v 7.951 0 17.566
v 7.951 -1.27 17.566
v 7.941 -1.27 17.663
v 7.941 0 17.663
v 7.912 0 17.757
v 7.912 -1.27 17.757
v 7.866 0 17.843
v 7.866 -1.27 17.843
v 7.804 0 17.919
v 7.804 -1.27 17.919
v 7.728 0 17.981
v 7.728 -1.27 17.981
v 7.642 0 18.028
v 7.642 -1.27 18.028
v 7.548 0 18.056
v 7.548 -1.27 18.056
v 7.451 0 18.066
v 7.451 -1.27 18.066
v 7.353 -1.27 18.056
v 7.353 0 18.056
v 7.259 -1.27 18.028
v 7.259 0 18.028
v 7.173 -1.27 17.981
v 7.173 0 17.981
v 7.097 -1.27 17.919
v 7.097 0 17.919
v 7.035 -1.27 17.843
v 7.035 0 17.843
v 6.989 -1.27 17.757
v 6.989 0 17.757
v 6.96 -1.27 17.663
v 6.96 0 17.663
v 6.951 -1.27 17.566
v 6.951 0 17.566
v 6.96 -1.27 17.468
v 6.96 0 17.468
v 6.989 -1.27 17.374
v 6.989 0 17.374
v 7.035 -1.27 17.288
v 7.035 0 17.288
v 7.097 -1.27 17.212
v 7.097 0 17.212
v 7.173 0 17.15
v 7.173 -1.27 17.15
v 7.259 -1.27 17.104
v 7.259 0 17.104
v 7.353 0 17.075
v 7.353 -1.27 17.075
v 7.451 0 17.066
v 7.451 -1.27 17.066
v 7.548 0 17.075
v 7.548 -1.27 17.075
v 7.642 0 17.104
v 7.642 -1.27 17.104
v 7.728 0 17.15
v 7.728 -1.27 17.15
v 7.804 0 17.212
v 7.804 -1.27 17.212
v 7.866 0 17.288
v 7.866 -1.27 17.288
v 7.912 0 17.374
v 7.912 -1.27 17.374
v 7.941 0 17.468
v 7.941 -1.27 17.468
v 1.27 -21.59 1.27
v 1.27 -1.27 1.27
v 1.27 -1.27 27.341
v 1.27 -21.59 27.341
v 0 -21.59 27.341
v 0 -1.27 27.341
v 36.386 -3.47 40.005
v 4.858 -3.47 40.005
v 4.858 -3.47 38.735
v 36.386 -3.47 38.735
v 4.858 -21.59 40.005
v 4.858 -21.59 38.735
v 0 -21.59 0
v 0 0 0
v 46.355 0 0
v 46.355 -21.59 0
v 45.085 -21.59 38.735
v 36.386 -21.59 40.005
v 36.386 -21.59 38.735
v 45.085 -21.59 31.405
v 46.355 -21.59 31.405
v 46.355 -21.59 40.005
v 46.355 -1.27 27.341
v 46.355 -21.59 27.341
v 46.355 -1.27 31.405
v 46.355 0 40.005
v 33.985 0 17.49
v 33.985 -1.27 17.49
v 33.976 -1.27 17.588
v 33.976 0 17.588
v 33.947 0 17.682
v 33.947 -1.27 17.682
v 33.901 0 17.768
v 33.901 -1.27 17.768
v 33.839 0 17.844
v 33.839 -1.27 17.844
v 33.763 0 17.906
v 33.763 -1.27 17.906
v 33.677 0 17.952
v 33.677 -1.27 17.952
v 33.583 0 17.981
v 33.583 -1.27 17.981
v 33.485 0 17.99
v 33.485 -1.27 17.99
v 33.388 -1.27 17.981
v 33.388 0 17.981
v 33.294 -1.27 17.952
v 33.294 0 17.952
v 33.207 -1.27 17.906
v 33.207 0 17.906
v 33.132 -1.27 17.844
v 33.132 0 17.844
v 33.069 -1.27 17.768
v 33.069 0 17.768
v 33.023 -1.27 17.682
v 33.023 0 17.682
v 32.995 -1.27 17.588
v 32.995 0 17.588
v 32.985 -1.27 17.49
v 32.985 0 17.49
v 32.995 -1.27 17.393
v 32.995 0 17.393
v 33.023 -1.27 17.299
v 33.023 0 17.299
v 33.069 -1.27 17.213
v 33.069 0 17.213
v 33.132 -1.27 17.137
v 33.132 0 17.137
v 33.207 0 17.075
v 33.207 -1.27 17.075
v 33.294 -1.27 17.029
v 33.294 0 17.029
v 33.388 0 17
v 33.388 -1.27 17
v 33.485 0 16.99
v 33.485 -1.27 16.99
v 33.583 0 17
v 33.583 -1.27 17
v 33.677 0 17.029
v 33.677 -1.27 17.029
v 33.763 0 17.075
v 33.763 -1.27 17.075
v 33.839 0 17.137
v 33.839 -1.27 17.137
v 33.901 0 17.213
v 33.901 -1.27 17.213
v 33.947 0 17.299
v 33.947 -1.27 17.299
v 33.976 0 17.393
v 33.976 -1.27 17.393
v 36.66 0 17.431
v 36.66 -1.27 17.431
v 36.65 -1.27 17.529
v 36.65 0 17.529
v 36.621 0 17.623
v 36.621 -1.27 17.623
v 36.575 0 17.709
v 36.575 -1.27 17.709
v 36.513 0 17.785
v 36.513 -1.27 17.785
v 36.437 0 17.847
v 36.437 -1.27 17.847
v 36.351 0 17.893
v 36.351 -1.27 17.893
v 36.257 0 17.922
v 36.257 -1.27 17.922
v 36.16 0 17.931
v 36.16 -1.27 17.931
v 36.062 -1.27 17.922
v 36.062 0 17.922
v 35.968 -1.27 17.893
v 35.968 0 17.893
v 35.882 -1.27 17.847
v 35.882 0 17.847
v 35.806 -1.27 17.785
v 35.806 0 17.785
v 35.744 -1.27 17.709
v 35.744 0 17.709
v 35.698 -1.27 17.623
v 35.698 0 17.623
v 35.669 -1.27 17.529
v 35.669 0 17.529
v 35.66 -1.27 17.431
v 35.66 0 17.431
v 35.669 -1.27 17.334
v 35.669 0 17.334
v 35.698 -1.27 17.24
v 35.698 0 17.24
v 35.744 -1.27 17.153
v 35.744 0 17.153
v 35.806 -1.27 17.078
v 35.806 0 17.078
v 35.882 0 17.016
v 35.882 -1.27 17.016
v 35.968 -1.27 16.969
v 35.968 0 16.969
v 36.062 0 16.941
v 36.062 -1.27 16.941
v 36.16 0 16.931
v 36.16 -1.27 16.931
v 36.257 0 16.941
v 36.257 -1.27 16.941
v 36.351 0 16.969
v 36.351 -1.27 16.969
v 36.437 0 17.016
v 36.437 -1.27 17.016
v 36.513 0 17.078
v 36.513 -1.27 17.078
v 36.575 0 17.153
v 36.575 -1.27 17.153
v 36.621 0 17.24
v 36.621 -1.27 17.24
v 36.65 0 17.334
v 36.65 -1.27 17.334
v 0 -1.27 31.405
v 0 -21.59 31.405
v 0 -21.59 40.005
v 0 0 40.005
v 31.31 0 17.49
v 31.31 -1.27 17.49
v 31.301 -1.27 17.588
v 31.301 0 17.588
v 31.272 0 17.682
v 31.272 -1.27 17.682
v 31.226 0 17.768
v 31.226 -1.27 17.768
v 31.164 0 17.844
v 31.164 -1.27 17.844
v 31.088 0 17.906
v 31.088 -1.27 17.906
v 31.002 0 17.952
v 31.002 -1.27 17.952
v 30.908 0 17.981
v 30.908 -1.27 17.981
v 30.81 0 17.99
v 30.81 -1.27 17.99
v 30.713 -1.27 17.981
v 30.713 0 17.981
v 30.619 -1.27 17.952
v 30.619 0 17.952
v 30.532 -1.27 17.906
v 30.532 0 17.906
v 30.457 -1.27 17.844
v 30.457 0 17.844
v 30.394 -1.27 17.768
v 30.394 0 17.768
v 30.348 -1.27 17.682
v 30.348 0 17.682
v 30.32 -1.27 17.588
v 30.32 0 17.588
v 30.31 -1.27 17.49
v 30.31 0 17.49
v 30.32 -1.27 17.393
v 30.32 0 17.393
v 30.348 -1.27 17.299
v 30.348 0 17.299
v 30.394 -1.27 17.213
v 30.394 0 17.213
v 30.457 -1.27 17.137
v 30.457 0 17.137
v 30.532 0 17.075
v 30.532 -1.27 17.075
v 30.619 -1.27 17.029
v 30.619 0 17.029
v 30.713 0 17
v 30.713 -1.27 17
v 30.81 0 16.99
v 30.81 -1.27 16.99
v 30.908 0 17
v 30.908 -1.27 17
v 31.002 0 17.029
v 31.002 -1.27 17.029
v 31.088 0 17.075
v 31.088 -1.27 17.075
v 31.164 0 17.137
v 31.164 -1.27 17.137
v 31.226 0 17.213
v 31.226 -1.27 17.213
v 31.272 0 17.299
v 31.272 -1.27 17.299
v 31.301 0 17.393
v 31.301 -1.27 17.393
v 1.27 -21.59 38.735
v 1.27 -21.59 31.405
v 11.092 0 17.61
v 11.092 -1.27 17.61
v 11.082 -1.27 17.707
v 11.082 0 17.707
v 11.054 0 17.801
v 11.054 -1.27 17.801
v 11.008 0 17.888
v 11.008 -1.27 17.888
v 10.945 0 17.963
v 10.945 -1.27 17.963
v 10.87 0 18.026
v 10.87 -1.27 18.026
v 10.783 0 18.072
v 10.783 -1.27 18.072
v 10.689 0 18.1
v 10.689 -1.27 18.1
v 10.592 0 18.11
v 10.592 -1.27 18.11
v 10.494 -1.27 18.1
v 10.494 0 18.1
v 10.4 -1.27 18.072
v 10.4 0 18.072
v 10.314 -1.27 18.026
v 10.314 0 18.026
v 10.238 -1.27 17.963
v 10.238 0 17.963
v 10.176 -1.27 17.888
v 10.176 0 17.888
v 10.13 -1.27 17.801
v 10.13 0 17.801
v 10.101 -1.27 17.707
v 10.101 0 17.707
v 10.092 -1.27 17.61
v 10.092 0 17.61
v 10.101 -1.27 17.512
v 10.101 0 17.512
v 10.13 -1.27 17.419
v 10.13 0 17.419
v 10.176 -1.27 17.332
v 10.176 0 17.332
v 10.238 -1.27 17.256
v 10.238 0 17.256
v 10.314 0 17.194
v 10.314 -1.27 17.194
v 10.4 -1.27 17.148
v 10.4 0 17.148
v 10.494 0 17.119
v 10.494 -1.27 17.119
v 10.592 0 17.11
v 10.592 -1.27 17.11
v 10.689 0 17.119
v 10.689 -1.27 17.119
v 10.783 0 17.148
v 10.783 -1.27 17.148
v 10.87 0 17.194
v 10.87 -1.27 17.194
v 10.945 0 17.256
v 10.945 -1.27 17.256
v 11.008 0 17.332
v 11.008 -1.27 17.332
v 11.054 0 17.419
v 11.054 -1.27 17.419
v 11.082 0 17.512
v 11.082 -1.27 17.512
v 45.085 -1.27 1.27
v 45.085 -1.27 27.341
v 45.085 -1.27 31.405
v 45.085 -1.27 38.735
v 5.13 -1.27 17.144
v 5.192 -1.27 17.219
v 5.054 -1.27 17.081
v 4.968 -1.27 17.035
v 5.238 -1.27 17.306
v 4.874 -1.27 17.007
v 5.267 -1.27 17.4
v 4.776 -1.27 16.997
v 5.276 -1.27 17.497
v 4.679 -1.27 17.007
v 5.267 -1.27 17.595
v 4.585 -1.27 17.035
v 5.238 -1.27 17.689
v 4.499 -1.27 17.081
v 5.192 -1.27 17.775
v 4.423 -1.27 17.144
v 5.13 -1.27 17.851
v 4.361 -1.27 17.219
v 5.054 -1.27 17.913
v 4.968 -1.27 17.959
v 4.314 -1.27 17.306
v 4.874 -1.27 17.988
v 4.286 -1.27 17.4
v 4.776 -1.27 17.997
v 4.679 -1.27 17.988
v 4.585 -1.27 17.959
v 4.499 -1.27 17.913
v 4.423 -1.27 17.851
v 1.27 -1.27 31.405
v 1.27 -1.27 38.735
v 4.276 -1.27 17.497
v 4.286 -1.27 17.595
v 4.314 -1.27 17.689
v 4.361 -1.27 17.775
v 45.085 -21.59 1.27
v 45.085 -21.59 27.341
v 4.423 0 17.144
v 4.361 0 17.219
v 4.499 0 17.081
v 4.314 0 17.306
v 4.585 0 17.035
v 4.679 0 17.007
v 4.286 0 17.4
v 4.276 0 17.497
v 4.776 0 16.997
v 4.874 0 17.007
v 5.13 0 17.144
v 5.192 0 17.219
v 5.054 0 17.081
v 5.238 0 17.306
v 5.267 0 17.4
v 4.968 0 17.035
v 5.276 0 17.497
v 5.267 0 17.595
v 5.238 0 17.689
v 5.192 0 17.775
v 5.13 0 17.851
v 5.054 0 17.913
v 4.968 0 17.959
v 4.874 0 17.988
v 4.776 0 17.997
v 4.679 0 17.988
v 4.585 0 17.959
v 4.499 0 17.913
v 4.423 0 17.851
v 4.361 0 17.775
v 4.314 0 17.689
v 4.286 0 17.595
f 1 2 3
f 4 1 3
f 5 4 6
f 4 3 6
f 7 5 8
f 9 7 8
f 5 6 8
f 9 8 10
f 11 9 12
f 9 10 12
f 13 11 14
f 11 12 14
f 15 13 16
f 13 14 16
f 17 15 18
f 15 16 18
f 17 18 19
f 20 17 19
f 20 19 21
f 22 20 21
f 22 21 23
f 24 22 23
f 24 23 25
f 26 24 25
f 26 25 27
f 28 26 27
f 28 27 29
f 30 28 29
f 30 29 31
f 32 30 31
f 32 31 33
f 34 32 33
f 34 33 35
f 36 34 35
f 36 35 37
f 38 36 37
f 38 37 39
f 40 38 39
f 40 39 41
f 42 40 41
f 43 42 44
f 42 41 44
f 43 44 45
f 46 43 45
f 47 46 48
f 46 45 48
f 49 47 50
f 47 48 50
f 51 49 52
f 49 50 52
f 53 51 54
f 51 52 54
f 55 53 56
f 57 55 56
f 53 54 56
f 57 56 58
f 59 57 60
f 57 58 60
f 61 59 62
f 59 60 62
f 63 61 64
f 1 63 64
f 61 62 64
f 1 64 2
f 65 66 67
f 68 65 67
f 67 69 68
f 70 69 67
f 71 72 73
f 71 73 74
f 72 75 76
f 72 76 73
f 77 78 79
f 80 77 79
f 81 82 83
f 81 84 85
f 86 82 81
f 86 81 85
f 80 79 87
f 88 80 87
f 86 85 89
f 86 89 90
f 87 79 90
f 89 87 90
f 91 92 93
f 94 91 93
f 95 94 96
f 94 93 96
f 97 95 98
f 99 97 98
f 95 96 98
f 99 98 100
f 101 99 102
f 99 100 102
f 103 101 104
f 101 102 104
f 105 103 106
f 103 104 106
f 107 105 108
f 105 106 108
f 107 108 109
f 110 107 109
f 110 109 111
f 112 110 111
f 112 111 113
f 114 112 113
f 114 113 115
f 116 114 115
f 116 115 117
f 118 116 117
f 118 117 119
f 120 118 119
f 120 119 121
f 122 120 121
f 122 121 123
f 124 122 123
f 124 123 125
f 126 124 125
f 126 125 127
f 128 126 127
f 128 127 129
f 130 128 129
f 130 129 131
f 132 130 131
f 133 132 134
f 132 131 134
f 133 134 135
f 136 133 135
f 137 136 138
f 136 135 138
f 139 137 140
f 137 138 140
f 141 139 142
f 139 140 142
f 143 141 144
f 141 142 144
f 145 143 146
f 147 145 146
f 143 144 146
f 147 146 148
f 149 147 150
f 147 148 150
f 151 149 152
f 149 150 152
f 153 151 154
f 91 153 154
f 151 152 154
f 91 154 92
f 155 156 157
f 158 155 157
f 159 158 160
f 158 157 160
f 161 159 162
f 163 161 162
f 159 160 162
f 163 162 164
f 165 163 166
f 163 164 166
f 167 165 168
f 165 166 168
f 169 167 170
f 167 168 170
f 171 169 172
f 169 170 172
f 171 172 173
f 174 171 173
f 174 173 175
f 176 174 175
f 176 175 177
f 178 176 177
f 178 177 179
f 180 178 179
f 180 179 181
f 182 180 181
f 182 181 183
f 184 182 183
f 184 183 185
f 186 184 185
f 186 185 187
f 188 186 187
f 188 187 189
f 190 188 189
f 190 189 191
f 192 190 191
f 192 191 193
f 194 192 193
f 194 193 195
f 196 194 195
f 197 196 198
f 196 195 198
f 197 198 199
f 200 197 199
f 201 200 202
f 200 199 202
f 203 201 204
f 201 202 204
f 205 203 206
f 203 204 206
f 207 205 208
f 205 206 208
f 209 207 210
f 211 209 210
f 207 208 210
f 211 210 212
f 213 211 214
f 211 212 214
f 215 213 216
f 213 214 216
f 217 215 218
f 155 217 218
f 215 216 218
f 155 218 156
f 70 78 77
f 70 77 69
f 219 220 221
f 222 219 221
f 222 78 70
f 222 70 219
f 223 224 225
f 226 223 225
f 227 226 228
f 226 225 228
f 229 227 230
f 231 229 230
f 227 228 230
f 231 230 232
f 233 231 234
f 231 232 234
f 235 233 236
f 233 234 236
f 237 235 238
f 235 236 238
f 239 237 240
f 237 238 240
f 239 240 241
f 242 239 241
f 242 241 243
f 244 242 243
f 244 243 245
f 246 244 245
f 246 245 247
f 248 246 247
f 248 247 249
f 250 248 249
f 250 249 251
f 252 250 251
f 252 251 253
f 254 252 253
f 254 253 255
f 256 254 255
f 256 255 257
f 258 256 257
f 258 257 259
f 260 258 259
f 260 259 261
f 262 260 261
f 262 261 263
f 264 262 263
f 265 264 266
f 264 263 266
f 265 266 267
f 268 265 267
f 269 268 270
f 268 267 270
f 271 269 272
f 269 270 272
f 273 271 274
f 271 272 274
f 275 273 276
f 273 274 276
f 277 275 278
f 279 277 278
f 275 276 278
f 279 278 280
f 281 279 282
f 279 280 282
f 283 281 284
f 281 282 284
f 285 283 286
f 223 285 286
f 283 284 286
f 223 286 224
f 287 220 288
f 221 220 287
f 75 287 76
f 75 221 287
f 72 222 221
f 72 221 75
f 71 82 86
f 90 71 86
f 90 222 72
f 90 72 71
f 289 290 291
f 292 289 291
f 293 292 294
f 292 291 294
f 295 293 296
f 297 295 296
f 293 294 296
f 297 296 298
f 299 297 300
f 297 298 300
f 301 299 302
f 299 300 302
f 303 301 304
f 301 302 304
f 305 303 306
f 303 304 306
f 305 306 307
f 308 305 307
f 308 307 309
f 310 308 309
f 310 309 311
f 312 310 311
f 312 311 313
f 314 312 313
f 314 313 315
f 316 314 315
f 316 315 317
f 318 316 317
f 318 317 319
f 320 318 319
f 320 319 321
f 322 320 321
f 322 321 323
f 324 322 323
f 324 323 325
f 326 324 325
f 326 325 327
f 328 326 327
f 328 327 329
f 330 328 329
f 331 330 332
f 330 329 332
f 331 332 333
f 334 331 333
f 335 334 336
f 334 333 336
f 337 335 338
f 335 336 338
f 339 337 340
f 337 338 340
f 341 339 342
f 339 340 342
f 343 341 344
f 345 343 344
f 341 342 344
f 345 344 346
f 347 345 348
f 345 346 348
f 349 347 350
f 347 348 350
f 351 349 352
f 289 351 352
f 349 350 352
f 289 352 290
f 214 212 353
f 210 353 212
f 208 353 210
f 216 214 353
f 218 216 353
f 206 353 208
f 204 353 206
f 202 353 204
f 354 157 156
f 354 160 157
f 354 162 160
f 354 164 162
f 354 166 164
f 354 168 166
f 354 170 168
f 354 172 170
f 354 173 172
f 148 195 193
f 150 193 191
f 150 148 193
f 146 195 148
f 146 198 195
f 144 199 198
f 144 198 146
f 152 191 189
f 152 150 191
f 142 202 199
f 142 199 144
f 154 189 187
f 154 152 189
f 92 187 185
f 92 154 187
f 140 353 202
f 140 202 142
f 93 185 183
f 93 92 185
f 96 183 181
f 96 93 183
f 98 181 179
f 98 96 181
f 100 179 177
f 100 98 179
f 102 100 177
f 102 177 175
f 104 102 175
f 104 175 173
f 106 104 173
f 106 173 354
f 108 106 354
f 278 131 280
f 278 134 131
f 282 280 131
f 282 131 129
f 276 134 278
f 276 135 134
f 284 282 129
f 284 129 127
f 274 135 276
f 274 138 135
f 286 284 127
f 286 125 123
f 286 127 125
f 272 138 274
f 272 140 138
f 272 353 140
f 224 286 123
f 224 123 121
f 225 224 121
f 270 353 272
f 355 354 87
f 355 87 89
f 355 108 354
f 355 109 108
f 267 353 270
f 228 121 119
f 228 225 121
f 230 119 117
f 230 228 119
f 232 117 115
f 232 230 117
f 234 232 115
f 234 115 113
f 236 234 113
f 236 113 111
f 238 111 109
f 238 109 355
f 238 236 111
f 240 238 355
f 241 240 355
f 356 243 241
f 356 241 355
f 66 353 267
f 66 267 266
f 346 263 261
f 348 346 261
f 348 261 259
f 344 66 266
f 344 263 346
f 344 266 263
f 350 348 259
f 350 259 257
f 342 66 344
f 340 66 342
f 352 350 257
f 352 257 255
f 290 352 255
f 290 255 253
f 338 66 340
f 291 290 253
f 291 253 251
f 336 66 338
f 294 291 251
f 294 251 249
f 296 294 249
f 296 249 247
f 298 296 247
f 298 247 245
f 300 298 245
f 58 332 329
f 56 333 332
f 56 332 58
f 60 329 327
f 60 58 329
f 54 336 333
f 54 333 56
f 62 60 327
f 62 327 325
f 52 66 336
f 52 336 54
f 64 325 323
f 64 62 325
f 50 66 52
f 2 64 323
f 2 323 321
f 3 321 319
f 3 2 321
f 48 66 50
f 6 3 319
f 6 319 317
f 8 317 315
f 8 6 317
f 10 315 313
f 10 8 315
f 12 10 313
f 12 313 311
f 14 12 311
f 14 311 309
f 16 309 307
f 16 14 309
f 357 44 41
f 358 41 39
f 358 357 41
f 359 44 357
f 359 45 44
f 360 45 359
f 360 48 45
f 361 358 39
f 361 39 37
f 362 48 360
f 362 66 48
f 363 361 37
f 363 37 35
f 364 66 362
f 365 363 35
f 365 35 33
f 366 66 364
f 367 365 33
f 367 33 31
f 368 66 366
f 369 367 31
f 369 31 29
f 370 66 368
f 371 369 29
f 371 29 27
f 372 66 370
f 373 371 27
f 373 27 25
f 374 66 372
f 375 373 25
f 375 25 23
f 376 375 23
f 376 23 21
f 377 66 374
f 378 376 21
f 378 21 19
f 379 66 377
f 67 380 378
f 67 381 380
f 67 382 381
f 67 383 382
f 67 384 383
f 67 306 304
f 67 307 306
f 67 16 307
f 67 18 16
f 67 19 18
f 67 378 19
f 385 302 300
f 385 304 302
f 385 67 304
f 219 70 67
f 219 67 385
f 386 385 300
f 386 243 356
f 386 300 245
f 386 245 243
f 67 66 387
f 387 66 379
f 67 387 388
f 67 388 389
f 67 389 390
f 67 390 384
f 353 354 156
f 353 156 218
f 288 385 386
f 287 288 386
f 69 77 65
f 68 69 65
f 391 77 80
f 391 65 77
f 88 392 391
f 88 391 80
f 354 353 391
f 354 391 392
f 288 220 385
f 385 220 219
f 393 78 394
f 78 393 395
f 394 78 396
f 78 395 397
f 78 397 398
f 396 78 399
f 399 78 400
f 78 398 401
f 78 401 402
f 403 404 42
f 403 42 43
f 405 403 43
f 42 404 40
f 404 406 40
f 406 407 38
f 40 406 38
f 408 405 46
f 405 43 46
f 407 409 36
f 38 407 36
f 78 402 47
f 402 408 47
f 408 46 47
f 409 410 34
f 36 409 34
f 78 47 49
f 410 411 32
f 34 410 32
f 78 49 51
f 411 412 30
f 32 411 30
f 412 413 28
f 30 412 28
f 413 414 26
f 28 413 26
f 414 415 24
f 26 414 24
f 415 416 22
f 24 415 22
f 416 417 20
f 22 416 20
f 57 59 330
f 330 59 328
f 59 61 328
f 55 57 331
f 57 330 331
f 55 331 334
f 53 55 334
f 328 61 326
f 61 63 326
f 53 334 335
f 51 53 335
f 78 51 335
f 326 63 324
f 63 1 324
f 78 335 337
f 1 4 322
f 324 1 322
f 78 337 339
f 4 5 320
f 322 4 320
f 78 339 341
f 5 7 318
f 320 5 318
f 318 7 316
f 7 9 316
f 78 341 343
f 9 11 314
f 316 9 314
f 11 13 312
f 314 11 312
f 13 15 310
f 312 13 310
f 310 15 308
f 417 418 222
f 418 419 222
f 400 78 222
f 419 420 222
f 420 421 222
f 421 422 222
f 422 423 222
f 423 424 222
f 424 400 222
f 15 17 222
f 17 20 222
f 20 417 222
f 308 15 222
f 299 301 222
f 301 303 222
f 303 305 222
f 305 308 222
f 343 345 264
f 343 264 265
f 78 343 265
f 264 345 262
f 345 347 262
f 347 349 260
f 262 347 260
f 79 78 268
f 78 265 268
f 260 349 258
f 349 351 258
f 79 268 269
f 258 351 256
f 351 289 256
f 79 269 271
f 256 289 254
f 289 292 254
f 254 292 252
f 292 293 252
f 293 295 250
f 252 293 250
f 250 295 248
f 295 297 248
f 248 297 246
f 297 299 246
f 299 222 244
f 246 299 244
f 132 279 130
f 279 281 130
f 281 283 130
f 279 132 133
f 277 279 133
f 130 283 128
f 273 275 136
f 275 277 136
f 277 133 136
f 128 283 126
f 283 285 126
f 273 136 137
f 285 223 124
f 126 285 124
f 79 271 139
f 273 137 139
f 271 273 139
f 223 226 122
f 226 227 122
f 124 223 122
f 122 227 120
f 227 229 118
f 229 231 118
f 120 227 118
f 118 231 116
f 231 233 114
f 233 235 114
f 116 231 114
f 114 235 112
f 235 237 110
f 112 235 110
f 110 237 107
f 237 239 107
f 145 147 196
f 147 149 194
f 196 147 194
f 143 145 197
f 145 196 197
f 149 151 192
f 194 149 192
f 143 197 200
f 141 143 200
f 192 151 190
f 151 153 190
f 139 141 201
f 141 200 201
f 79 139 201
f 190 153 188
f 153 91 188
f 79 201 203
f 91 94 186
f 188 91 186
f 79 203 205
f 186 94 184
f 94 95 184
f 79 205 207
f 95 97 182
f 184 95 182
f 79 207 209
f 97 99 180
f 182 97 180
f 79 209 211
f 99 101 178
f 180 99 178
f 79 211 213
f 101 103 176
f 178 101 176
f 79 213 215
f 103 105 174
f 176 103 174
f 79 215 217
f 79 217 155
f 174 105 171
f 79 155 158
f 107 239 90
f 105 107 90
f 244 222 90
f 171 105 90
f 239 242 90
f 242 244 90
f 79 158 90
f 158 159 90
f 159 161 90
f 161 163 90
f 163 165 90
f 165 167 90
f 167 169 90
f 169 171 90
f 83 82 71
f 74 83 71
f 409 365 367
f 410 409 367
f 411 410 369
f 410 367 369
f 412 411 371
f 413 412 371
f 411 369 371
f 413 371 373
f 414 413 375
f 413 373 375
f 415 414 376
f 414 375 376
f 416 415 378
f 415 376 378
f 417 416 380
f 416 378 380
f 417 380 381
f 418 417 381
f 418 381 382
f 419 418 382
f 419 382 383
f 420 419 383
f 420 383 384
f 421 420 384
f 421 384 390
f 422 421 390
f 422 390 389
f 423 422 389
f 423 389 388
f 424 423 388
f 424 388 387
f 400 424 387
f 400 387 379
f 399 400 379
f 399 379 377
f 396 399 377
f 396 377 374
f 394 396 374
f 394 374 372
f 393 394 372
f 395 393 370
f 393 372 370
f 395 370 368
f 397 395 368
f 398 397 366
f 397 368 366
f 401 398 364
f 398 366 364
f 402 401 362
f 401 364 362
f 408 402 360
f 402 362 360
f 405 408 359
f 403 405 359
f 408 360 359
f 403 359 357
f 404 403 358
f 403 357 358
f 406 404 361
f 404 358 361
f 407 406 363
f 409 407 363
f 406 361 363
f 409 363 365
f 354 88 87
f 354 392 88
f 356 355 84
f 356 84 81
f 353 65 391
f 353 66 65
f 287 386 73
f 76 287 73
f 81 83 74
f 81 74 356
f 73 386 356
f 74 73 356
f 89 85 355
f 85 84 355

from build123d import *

# Parameters (mm, degrees)
F0_W      = 46.355
F0_H      = 40.005
F1_DEPTH  = 21.59
F3_T      = -1.27
F5_W      = 26.924
F5_H      = 4.064
F6_DEPTH  = 63.246
F8_D      = 1.000001
F10_D     = 1.000001
F12_D     = 1.000001
F14_D     = 1.000001
F16_D     = 1.000001
F18_W     = 31.528105
F18_H     = 18.119926
F19_DEPTH = 25.4
F20_D     = 1.000001


with BuildPart() as f1:
    # F0 (on Front) → F1 (new body)
    with BuildSketch(Plane.XZ):
        with Locations((23.1775, 20.0025)):
            Rectangle(F0_W, F0_H)
    extrude(amount=F1_DEPTH)

    # F3
    f3_openings = [f1.faces().sort_by_distance(p)[0] for p in [
        (23.1775, -21.59, 20.0025),
    ]]
    offset(amount=F3_T, openings=f3_openings)

    # F5 (on Right) → F6 (cut)
    with BuildSketch(Plane.YZ):
        with Locations((-14.732, 29.373137)):
            Rectangle(F5_W, F5_H)
    extrude(amount=F6_DEPTH, mode=Mode.SUBTRACT)

    # F8 (through all)
    with Locations(Plane(origin=(0, 0, 0), x_dir=(-1, 0, 0), z_dir=(0, 1, 0))):
        with Locations((-10.5918, 17.609857)):
            Hole(F8_D / 2)

    # F10 (through all)
    with Locations(Plane(origin=(0, 0, 0), x_dir=(-1, 0, 0), z_dir=(0, 1, 0))):
        with Locations((-30.8102, 17.490488)):
            Hole(F10_D / 2)

    # F12 (through all)
    with Locations(Plane(origin=(0, 0, 0), x_dir=(-1, 0, 0), z_dir=(0, 1, 0))):
        with Locations((-33.4852, 17.490488)):
            Hole(F12_D / 2)

    # F14 (through all)
    with Locations(Plane(origin=(0, 0, 0), x_dir=(-1, 0, 0), z_dir=(0, 1, 0))):
        with Locations((-36.159544, 17.431264)):
            Hole(F14_D / 2)

    # F16 (through all)
    with Locations(Plane(origin=(0, 0, 0), x_dir=(-1, 0, 0), z_dir=(0, 1, 0))):
        with Locations((-7.450511, 17.565635)):
            Hole(F16_D / 2)

    # F18 (on face) → F19 (cut)
    with BuildSketch(Plane.XY.offset(40.005)):
        with Locations((20.622158, -12.530037)):
            Rectangle(F18_W, F18_H)
    extrude(amount=-F19_DEPTH, mode=Mode.SUBTRACT)

    # F20 (through all)
    with Locations(Plane(origin=(0, 0, 0), x_dir=(-1, 0, 0), z_dir=(0, 1, 0))):
        with Locations((-4.776387, 17.497179)):
            Hole(F20_D / 2)


solid = f1.part
